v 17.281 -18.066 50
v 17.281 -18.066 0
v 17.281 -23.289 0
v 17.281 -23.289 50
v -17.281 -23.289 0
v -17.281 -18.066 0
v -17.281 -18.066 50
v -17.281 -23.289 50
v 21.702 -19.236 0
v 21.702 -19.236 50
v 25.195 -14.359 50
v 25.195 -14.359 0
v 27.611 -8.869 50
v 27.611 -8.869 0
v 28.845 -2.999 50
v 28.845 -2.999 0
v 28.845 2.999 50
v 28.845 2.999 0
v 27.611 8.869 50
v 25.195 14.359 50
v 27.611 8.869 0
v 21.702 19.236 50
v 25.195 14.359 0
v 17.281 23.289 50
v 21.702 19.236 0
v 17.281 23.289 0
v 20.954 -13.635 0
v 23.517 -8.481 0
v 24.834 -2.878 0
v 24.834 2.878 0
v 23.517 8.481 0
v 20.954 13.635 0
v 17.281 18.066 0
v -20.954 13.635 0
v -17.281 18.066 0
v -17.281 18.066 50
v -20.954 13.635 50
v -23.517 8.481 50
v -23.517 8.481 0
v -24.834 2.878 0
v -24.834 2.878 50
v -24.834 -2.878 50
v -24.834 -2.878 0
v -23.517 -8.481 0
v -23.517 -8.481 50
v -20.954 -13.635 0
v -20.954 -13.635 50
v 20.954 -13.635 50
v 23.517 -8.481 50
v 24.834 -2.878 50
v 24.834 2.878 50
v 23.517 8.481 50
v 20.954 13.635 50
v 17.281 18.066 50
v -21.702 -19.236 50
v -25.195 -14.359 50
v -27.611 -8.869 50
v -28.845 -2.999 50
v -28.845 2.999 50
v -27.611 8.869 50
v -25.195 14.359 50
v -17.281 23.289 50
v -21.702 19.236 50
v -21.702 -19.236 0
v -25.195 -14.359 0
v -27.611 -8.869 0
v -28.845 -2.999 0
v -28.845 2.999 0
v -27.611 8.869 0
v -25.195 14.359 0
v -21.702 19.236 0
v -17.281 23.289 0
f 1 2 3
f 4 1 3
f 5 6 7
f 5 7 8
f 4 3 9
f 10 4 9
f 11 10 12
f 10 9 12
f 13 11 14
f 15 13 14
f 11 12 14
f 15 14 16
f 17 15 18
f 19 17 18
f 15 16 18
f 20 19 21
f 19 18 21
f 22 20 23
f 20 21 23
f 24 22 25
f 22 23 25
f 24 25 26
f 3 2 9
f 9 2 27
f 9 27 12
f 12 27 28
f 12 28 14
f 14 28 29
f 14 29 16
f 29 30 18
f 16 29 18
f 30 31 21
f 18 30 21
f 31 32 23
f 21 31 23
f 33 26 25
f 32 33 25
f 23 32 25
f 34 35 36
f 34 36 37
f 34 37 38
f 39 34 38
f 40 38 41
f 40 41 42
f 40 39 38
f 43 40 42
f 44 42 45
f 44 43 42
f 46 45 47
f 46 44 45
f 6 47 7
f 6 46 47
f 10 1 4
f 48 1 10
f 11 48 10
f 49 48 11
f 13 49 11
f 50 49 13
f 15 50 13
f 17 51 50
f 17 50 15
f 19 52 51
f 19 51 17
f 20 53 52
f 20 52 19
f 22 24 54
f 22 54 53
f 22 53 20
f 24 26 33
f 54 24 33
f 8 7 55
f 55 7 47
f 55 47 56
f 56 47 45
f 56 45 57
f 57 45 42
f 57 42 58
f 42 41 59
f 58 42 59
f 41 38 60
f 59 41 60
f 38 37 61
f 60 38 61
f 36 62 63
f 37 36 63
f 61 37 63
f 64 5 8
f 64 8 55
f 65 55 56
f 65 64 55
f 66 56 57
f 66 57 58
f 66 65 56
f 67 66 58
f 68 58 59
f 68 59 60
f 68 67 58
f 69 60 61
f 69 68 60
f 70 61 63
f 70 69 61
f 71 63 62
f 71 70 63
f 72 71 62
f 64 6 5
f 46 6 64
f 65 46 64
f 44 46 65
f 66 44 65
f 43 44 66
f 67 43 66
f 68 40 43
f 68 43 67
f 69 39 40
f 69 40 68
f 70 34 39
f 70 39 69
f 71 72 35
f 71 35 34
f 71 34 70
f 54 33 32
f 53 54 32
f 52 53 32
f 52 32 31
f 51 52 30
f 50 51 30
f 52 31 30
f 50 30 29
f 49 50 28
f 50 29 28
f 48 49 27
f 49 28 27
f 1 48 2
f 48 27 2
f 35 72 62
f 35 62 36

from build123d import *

# Parameters (mm, degrees)
BOSS_EXTRUDE1_DEPTH   = 50
BOSS_EXTRUDE1_2_DEPTH = 50


with BuildPart() as part:
    # Sketch1 → Boss-Extrude1 (new body)
    with BuildSketch(Plane.XY):
        with BuildLine():
            Line((-17.280821918, -18.065801777), (-17.280821918, -23.288907099))
            ThreePointArc((-17.280821918, -23.288907099), (-29, 0), (-17.280821918, 23.288907099))
            Line((-17.280821918, 23.288907099), (-17.280821918, 18.065801777))
            ThreePointArc((-17.280821918, 18.065801777), (-25, 0), (-17.280821918, -18.065801777))
        make_face()
    extrude(amount=BOSS_EXTRUDE1_DEPTH)


with BuildPart() as body_2:
    # Sketch1 → Boss-Extrude1 2 (new body)
    with BuildSketch(Plane.XY):
        with BuildLine():
            Line((17.280821918, 23.288907099), (17.280821918, 18.065801777))
            ThreePointArc((17.280821918, 18.065801777), (25, 0), (17.280821918, -18.065801777))
            Line((17.280821918, -18.065801777), (17.280821918, -23.288907099))
            ThreePointArc((17.280821918, -23.288907099), (29, 0), (17.280821918, 23.288907099))
        make_face()
    extrude(amount=BOSS_EXTRUDE1_2_DEPTH)


solid = Compound([part.part, body_2.part])
